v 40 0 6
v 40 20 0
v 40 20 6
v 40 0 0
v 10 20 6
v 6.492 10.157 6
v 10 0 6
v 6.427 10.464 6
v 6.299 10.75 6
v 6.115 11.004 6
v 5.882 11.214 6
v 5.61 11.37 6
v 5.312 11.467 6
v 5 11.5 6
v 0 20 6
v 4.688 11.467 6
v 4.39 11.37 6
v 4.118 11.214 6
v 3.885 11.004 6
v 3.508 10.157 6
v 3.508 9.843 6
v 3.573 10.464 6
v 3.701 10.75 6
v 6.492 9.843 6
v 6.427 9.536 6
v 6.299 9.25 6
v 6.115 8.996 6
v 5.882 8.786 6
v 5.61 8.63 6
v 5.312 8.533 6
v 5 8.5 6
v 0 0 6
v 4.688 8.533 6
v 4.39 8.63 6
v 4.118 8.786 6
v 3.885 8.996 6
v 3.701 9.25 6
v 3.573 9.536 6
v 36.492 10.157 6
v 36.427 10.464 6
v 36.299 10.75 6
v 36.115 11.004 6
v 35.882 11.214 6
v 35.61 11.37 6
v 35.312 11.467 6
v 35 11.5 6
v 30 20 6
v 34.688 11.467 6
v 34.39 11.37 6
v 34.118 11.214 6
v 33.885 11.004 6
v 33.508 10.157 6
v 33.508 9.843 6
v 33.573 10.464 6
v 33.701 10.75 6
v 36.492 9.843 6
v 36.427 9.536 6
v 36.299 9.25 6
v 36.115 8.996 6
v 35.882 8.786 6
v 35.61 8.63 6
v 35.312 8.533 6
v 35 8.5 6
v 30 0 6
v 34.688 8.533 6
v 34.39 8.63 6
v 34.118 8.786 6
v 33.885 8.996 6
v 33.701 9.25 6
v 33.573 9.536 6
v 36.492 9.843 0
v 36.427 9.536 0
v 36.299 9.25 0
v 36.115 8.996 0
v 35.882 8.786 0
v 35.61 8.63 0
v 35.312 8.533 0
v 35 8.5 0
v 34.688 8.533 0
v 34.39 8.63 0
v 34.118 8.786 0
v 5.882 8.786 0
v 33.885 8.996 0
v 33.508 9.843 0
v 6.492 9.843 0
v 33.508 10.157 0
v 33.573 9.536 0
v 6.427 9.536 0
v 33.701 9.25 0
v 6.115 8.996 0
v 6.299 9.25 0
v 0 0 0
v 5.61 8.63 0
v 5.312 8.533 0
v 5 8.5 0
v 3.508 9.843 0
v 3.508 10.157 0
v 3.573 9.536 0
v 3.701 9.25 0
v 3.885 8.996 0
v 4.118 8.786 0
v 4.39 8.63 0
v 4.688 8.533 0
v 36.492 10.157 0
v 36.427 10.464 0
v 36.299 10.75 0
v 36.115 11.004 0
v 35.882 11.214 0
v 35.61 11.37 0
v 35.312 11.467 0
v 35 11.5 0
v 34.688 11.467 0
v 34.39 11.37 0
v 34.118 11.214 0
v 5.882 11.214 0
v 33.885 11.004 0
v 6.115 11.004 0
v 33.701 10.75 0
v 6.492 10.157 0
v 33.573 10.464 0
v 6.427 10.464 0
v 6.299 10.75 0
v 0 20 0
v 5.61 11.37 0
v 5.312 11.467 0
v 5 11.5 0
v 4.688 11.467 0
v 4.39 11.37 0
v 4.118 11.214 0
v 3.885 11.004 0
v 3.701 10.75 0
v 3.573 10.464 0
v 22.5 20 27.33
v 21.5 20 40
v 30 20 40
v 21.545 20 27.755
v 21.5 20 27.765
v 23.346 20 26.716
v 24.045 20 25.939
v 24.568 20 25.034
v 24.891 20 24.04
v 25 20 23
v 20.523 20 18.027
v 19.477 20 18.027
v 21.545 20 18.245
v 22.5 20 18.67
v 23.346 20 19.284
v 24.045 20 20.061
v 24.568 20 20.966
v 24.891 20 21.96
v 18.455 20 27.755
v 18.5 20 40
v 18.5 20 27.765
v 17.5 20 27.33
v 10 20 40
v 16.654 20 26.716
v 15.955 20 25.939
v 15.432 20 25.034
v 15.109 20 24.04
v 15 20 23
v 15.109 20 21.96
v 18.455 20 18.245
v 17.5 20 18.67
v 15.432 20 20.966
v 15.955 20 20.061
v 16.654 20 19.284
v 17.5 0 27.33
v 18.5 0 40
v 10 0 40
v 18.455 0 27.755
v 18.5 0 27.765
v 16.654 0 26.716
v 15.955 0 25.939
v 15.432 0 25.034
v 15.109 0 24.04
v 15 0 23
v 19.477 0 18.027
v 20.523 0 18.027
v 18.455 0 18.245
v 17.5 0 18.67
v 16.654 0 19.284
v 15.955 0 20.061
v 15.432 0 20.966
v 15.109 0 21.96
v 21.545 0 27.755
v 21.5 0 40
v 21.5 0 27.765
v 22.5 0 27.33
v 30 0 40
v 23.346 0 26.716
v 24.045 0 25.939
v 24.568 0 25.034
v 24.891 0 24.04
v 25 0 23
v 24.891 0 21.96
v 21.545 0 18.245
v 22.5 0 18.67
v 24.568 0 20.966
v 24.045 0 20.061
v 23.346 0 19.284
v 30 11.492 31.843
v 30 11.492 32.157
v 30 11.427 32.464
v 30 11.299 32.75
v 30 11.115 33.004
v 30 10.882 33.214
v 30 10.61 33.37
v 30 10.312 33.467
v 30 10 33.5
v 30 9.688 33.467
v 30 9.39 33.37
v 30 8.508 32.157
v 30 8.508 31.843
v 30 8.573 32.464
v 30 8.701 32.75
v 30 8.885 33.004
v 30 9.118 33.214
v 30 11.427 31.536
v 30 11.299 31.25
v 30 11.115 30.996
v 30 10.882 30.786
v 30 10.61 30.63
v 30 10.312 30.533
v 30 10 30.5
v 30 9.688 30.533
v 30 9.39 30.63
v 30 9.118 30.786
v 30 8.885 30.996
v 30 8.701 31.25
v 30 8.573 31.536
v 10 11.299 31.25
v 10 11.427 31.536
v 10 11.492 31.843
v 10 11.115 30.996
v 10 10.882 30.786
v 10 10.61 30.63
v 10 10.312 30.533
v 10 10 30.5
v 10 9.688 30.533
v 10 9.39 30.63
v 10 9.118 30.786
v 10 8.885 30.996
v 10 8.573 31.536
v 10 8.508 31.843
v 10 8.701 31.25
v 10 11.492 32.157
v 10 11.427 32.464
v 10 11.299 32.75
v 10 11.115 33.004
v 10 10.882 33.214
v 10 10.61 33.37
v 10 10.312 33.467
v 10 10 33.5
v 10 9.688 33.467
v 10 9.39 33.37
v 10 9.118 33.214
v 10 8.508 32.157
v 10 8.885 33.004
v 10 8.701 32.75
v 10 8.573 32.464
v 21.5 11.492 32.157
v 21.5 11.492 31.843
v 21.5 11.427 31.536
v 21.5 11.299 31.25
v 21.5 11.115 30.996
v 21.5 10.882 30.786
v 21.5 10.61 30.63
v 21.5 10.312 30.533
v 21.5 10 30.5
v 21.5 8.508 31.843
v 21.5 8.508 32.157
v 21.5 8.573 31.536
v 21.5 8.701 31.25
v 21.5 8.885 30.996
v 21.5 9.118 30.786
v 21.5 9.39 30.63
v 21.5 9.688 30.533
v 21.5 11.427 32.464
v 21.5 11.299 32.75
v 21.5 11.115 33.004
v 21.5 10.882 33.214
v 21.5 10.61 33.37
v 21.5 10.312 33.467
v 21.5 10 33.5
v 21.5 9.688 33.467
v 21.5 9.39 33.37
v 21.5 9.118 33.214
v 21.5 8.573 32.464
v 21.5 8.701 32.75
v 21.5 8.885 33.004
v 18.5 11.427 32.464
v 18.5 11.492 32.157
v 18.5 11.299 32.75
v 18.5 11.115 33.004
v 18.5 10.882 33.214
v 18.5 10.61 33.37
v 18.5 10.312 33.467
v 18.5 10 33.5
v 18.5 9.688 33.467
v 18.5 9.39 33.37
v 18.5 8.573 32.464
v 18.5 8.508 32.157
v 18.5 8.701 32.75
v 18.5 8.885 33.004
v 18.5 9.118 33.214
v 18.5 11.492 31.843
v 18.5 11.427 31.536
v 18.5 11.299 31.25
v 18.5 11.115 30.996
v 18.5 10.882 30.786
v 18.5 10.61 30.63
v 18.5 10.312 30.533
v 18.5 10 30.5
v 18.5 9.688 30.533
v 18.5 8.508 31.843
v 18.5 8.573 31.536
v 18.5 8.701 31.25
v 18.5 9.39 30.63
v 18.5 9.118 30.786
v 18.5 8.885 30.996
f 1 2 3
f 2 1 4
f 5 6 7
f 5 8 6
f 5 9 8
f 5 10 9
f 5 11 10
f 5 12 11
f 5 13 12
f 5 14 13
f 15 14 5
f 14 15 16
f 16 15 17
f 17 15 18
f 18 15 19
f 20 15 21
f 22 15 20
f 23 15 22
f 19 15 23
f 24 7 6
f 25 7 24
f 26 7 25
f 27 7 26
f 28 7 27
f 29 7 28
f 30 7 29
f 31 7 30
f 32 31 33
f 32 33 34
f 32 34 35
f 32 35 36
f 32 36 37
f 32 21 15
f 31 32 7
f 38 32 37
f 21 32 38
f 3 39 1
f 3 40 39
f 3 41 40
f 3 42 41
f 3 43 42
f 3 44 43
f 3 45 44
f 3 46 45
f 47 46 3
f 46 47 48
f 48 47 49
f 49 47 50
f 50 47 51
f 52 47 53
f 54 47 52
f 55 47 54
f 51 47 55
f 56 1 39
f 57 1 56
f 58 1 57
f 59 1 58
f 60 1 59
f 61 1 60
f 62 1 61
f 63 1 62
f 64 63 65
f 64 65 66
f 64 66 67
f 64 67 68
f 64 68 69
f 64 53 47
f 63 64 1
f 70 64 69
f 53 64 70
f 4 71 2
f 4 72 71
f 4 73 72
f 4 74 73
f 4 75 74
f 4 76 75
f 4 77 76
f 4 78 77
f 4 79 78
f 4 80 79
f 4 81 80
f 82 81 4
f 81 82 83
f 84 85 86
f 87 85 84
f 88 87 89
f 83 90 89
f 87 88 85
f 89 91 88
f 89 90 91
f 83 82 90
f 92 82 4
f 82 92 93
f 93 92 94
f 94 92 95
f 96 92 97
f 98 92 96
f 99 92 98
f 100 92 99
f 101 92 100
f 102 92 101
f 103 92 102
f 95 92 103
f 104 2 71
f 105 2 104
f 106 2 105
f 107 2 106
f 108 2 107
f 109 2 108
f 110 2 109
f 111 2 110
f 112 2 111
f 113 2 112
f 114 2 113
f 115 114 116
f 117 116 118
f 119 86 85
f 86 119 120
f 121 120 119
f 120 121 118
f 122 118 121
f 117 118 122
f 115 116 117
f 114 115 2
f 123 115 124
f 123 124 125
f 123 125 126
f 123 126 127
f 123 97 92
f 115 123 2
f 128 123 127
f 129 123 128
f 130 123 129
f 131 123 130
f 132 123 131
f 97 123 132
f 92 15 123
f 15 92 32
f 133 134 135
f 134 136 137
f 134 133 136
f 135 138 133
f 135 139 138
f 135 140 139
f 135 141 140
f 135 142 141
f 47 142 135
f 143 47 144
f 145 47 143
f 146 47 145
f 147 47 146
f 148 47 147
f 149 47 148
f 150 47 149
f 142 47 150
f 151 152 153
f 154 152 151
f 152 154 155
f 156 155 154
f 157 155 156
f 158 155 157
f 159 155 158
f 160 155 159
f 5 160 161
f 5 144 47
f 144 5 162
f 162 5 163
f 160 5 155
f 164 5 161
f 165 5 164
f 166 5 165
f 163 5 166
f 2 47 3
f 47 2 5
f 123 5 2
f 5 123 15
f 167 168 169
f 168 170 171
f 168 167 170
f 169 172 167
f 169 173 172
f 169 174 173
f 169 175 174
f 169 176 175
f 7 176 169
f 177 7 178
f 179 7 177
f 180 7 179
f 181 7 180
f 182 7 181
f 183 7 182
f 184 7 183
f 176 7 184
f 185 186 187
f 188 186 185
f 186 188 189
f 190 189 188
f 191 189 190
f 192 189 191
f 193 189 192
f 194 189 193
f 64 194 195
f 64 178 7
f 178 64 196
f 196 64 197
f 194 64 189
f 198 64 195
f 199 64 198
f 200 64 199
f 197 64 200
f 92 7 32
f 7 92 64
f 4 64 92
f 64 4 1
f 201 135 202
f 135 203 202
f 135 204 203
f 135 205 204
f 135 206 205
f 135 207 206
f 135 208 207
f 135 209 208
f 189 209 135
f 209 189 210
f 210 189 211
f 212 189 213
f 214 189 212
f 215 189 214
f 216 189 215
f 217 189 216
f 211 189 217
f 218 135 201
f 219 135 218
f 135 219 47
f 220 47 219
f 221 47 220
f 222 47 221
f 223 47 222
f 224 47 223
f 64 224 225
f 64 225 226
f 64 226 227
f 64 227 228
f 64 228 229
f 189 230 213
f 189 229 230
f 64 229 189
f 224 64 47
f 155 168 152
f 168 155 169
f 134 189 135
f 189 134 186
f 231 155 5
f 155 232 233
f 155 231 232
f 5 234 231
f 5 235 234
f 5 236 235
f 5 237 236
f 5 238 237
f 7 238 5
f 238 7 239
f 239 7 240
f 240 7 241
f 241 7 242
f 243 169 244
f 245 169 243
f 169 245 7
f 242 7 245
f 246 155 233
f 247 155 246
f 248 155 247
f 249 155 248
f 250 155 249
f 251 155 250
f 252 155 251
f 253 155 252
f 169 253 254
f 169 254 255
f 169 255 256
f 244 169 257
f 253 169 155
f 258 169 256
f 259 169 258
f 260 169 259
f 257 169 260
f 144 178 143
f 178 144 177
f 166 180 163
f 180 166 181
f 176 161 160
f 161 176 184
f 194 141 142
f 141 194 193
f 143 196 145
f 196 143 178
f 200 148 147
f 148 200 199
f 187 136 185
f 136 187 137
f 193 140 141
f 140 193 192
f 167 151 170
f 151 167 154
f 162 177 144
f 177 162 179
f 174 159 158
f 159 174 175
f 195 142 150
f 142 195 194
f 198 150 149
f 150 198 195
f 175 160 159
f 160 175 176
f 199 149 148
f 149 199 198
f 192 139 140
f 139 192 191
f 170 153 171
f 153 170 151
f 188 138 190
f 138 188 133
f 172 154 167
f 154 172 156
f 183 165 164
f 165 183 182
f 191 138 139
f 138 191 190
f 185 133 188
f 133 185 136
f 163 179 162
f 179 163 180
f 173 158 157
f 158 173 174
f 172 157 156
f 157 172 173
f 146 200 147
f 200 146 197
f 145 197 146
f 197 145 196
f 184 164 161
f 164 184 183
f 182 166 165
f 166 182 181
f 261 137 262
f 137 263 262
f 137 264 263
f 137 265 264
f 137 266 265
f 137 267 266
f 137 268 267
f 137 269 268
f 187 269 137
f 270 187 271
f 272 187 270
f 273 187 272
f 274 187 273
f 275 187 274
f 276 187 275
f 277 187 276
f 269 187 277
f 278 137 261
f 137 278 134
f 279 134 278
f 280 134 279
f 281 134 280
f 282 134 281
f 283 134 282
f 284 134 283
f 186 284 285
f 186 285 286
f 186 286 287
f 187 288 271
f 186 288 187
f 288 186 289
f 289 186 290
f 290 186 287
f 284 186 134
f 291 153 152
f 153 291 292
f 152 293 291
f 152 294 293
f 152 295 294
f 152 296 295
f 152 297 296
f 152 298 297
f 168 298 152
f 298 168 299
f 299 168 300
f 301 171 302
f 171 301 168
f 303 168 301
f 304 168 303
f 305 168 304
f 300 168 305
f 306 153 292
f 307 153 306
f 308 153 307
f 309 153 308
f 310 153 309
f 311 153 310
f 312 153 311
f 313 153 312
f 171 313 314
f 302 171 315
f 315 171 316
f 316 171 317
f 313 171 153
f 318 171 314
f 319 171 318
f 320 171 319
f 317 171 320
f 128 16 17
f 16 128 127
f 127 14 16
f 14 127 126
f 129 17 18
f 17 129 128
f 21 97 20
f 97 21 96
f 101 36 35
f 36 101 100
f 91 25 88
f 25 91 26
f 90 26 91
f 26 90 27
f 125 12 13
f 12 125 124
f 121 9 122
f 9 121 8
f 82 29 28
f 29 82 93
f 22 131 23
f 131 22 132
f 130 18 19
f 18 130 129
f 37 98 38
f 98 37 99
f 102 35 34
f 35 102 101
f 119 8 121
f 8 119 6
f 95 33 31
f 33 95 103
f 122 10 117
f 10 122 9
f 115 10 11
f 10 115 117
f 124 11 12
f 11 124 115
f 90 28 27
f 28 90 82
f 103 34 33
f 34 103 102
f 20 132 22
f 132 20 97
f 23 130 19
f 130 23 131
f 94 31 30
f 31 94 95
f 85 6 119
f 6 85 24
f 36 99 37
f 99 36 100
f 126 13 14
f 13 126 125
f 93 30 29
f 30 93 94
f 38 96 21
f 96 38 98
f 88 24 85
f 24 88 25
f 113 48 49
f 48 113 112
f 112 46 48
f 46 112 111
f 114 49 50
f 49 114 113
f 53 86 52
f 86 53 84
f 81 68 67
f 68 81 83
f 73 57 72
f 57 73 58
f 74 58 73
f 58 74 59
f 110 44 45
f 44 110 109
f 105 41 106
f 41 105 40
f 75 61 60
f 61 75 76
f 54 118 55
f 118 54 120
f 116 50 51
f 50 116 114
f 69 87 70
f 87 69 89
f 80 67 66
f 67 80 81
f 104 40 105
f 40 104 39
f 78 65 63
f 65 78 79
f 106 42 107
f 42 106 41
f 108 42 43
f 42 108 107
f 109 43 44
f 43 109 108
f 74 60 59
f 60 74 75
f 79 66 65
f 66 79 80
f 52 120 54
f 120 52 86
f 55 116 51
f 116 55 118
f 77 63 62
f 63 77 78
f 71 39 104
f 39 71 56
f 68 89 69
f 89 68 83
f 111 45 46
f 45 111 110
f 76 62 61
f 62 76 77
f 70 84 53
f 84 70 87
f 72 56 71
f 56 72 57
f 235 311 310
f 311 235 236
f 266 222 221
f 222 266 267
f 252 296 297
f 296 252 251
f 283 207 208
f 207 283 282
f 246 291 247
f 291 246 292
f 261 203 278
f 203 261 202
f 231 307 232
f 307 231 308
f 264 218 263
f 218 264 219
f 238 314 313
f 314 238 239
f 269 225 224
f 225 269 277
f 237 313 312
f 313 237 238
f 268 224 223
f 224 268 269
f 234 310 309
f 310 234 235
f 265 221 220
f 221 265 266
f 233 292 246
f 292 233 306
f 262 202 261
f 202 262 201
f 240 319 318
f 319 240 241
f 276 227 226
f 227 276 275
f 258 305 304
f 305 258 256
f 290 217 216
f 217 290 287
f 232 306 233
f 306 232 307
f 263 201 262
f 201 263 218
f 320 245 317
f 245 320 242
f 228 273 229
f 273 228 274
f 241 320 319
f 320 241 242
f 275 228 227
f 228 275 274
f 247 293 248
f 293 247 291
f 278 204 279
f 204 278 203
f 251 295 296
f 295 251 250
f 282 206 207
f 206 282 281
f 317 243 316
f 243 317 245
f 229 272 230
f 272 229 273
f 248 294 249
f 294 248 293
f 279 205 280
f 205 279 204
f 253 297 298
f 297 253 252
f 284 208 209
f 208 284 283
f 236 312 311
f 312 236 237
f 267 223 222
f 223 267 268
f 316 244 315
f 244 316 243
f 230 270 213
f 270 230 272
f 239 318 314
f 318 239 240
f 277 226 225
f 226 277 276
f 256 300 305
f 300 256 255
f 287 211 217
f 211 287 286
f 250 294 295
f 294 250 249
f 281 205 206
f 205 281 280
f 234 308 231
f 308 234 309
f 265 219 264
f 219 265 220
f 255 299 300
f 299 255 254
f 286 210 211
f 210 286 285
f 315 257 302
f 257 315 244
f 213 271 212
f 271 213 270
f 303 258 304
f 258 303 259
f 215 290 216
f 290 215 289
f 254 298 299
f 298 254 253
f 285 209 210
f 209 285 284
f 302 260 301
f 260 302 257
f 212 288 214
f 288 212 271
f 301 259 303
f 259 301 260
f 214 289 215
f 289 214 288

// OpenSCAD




$fn=30; //number of fragments
Width=40;
Depth=20;
BaseHeight=6;    
TopWidth=20;
TopGap=3;
Height=40;
RodDiameter=10;



module Base_SK(Width,Depth,BaseHeight,TopWidth,Height)
{
    
cube([Width,Depth,BaseHeight]);
translate([(Width/2-TopWidth/2),0,BaseHeight])
    cube([TopWidth,Depth,Height-BaseHeight]);
}


difference()
{
    difference()
    {
        difference()
        {
            difference()
            {
                difference()
                {
                Base_SK(Width,Depth,BaseHeight,TopWidth,Height);
                translate([(Width/2-TopWidth/2)+TopWidth/2,Depth,Height/2+3])
                    rotate(90, [ 1, 0, 0 ])
                        cylinder(h=Depth+1,r=RodDiameter/2);
                }
                translate([Width/2-TopGap/2,0,Height/2+5]) // Rod Hole Gap 
                    cube([TopGap,Depth,15]);
            }
            translate([(Width-TopWidth)/4,Depth/2,0]) //Left base hole
                rotate(90, [ 0, 0, 1 ])
                    cylinder(h=BaseHeight+5,r=1.5);     
        }
        translate([Width-(Width-TopWidth)/4,Depth/2,0]) //Right base hole
            rotate(90, [ 0, 0, 1 ])
                cylinder(h=BaseHeight+5,r=1.5);
    }
    translate([0,Depth/2,Height-Height/5]) //Rod Hole
        rotate(90, [ 0, 1, 0 ])
            cylinder(h=BaseHeight+25,r=1.5);   
}
